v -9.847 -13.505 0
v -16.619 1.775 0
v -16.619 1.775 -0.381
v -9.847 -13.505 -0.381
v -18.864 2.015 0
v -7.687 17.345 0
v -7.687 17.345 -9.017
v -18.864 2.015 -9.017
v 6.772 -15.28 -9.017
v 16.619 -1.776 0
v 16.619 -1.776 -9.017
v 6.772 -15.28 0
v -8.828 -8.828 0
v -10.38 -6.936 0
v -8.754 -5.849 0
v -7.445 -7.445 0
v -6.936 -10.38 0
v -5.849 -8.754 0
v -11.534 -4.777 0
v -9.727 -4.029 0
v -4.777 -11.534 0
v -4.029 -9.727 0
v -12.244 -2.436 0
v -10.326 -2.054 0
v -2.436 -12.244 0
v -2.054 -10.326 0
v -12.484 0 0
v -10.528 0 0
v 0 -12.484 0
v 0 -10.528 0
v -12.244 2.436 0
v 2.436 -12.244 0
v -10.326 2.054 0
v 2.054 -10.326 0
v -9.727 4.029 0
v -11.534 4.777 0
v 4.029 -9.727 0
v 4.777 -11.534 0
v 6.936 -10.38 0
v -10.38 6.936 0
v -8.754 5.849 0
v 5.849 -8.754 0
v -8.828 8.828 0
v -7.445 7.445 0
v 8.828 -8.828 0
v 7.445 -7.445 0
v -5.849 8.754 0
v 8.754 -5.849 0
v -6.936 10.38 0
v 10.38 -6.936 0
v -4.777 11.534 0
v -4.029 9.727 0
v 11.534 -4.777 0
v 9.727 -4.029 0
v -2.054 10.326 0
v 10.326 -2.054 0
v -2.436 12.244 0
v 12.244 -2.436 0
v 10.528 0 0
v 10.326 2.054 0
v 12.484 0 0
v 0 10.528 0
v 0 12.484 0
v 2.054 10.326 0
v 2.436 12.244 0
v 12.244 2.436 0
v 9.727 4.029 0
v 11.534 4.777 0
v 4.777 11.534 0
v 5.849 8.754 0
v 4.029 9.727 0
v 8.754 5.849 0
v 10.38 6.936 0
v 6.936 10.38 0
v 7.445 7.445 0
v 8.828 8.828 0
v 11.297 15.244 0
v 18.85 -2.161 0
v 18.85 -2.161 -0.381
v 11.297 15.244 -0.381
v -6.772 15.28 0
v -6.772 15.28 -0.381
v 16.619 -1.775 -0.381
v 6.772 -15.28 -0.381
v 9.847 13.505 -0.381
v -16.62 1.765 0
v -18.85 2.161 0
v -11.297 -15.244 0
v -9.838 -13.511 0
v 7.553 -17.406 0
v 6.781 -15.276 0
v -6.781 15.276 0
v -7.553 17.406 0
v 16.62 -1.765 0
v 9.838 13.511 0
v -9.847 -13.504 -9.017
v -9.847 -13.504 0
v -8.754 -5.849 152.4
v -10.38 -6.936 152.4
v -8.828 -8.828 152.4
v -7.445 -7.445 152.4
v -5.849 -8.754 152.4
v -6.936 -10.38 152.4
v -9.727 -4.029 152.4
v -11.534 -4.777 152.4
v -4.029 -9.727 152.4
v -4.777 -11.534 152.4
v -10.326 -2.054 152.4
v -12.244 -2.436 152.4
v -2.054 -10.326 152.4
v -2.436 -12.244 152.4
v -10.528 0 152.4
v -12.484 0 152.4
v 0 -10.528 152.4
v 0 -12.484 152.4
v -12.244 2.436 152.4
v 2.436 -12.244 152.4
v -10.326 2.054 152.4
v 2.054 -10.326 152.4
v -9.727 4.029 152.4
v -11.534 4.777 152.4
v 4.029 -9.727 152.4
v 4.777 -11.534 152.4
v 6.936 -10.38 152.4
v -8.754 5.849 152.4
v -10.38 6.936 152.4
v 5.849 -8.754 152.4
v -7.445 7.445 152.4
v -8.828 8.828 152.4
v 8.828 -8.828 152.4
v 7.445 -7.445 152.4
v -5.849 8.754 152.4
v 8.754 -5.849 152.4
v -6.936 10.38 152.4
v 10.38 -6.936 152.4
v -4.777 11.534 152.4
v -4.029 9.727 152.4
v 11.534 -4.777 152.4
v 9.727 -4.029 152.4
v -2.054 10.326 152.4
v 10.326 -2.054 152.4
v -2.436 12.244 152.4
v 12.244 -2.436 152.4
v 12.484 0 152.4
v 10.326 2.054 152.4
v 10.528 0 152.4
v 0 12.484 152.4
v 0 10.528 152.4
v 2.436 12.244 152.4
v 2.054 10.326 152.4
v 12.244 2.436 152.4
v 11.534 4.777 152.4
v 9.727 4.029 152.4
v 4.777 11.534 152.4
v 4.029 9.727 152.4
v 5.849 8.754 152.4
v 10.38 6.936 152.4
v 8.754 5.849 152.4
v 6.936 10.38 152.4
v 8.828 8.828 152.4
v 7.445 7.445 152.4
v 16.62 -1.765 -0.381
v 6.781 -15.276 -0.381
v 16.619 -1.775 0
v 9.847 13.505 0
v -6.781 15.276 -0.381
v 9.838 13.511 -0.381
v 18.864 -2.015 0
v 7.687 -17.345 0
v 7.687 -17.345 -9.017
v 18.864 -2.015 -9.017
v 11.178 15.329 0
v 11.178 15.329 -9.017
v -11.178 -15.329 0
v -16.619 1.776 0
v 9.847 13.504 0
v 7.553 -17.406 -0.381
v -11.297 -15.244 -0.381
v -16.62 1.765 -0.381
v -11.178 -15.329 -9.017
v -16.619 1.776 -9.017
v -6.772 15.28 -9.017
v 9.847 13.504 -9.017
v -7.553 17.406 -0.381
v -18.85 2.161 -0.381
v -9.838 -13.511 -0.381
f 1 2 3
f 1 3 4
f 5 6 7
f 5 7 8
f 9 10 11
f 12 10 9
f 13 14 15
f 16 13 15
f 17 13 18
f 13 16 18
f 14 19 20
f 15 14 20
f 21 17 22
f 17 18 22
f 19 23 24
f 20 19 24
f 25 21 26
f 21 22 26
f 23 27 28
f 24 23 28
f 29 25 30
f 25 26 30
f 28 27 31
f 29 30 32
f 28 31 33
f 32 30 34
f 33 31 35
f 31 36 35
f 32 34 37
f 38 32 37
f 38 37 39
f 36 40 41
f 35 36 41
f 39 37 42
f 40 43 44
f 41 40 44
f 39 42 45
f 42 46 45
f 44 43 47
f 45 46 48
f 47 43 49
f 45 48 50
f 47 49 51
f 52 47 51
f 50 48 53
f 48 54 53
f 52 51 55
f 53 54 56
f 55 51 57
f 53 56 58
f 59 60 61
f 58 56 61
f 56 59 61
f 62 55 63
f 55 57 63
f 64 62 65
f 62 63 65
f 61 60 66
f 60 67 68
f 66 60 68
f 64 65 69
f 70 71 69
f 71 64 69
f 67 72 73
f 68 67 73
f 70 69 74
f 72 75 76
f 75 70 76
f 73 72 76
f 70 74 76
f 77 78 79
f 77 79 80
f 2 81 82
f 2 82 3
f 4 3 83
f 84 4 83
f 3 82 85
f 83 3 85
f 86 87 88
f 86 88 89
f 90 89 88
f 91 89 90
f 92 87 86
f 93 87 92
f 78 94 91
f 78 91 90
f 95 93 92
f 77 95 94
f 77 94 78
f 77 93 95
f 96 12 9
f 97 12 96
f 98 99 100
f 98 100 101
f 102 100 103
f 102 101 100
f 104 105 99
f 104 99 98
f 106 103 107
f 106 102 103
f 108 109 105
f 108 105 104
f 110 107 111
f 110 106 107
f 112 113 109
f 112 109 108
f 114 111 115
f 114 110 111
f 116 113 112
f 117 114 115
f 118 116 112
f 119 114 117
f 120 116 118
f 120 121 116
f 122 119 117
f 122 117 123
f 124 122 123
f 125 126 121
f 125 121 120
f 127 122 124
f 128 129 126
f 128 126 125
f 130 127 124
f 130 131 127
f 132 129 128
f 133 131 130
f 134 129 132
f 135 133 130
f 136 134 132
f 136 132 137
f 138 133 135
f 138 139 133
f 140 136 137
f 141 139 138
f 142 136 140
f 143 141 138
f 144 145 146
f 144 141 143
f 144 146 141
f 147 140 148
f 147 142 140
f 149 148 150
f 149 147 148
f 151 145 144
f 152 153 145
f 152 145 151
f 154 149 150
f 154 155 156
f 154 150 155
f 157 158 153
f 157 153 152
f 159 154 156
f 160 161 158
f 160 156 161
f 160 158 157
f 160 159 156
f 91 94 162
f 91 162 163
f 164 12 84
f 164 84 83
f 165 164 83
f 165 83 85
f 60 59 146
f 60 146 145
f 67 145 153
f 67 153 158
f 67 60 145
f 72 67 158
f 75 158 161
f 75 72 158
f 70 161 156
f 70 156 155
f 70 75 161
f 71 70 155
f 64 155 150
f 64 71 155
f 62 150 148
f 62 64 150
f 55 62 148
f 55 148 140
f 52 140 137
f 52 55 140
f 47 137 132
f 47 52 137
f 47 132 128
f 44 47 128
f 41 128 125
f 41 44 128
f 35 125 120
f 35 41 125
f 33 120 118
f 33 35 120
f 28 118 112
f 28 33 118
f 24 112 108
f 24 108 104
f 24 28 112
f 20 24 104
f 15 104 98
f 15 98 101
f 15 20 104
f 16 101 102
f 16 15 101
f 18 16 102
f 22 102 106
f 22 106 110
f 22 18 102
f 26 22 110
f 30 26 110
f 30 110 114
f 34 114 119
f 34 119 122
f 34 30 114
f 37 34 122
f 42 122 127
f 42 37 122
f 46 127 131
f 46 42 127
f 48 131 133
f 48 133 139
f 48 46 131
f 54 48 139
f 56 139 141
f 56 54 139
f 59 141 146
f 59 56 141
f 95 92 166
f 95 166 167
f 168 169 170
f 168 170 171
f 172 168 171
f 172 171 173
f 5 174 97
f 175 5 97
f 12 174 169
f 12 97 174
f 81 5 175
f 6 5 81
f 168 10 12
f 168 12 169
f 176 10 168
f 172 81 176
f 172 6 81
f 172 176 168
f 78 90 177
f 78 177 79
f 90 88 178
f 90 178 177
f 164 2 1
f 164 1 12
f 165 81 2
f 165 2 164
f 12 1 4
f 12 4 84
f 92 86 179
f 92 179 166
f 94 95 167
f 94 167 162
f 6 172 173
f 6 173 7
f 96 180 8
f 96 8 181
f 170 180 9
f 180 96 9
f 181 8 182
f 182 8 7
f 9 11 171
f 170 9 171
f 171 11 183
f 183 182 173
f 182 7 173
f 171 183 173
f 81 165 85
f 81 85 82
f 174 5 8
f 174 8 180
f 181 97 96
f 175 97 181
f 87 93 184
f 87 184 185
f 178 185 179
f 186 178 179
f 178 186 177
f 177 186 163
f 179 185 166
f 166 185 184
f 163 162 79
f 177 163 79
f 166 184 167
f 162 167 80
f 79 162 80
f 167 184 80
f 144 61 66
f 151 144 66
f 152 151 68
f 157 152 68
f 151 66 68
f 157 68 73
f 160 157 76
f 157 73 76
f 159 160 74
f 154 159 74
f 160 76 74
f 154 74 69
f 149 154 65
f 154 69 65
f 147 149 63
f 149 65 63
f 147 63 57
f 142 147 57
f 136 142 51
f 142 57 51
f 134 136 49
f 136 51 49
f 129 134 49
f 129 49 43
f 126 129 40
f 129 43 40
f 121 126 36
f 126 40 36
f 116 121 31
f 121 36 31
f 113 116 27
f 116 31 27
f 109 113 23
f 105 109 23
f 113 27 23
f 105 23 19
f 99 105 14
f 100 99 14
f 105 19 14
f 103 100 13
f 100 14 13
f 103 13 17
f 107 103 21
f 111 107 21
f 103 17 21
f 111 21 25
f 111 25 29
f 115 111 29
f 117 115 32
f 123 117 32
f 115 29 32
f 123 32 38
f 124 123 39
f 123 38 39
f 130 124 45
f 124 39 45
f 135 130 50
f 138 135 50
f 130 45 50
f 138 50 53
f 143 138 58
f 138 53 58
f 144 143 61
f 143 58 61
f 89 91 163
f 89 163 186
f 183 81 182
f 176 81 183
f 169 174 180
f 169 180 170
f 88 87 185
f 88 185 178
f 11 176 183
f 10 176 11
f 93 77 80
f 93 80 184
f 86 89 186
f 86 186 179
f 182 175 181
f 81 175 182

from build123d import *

# Parameters (mm, degrees)
F1_DEPTH  = 9.017
F2_R      = 12.4841
F2_R_2    = 10.5283
F3_DEPTH  = 152.4
F5_R      = 10.5283
F6_DEPTH  = 25.4
F8_DEPTH  = 0.381
F10_DEPTH = 0.381
F11_R     = 10.5283
F12_DEPTH = 25.4


with BuildPart() as f1:
    # F0 (on Top) → F1 (new body)
    with BuildSketch(Plane.XY):
        Polygon((7.6866848508, -17.3445983102), (18.8642051805, -2.0154348034), (11.1775203296, 15.3291635068), (-7.6866848508, 17.3445983102), (-18.8642051805, 2.0154348034), (-11.1775203296, -15.3291635068), align=None)
        Polygon((9.8469551345, 13.5043892428), (16.6186217141, -1.775518675), (6.7716665796, -15.2799079178), (-9.8469551345, -13.5043892428), (-16.6186217141, 1.775518675), (-6.7716665796, 15.2799079178), align=None, mode=Mode.SUBTRACT)
    extrude(amount=-F1_DEPTH)

    # F5 (on Top) → F6 (cut)
    with BuildSketch(Plane.XY):
        Circle(F5_R)
    extrude(amount=F6_DEPTH, mode=Mode.SUBTRACT)

    # F11 (on Top) → F12 (cut)
    with BuildSketch(Plane.XY):
        Circle(F11_R)
    extrude(amount=F12_DEPTH, mode=Mode.SUBTRACT)


with BuildPart() as f3:
    # F2 (on Top) → F3 (new body)
    with BuildSketch(Plane.XY):
        Circle(F2_R)
        Circle(F2_R_2, mode=Mode.SUBTRACT)
    extrude(amount=F3_DEPTH)


with BuildPart() as f8:
    # F7 (on Top) → F8 (new body)
    with BuildSketch(Plane.XY):
        Polygon((6.7719303097, -15.2797910366), (16.618652357, -1.7752318375), (9.8467220474, 13.5045591991), (-6.7719303097, 15.2797910366), (-16.618652357, 1.7752318375), (-9.8467220474, -13.5045591991), align=None)
    extrude(amount=-F8_DEPTH)


with BuildPart() as f10:
    # F9 (on Top) → F10 (new body)
    with BuildSketch(Plane.XY):
        Polygon((7.5533707782, -17.405507069), (18.8502966765, -2.1613425564), (11.2969258984, 15.2441645126), (-7.5533707782, 17.405507069), (-18.8502966765, 2.1613425564), (-11.2969258984, -15.2441645126), align=None)
        Polygon((9.8383313898, 13.5106731773), (16.6197518887, -1.7649083258), (6.7814204989, -15.2755815031), (-9.8383313898, -13.5106731773), (-16.6197518887, 1.7649083258), (-6.7814204989, 15.2755815031), align=None, mode=Mode.SUBTRACT)
    extrude(amount=-F10_DEPTH)


solid = Compound([f1.part, f3.part, f8.part, f10.part])
